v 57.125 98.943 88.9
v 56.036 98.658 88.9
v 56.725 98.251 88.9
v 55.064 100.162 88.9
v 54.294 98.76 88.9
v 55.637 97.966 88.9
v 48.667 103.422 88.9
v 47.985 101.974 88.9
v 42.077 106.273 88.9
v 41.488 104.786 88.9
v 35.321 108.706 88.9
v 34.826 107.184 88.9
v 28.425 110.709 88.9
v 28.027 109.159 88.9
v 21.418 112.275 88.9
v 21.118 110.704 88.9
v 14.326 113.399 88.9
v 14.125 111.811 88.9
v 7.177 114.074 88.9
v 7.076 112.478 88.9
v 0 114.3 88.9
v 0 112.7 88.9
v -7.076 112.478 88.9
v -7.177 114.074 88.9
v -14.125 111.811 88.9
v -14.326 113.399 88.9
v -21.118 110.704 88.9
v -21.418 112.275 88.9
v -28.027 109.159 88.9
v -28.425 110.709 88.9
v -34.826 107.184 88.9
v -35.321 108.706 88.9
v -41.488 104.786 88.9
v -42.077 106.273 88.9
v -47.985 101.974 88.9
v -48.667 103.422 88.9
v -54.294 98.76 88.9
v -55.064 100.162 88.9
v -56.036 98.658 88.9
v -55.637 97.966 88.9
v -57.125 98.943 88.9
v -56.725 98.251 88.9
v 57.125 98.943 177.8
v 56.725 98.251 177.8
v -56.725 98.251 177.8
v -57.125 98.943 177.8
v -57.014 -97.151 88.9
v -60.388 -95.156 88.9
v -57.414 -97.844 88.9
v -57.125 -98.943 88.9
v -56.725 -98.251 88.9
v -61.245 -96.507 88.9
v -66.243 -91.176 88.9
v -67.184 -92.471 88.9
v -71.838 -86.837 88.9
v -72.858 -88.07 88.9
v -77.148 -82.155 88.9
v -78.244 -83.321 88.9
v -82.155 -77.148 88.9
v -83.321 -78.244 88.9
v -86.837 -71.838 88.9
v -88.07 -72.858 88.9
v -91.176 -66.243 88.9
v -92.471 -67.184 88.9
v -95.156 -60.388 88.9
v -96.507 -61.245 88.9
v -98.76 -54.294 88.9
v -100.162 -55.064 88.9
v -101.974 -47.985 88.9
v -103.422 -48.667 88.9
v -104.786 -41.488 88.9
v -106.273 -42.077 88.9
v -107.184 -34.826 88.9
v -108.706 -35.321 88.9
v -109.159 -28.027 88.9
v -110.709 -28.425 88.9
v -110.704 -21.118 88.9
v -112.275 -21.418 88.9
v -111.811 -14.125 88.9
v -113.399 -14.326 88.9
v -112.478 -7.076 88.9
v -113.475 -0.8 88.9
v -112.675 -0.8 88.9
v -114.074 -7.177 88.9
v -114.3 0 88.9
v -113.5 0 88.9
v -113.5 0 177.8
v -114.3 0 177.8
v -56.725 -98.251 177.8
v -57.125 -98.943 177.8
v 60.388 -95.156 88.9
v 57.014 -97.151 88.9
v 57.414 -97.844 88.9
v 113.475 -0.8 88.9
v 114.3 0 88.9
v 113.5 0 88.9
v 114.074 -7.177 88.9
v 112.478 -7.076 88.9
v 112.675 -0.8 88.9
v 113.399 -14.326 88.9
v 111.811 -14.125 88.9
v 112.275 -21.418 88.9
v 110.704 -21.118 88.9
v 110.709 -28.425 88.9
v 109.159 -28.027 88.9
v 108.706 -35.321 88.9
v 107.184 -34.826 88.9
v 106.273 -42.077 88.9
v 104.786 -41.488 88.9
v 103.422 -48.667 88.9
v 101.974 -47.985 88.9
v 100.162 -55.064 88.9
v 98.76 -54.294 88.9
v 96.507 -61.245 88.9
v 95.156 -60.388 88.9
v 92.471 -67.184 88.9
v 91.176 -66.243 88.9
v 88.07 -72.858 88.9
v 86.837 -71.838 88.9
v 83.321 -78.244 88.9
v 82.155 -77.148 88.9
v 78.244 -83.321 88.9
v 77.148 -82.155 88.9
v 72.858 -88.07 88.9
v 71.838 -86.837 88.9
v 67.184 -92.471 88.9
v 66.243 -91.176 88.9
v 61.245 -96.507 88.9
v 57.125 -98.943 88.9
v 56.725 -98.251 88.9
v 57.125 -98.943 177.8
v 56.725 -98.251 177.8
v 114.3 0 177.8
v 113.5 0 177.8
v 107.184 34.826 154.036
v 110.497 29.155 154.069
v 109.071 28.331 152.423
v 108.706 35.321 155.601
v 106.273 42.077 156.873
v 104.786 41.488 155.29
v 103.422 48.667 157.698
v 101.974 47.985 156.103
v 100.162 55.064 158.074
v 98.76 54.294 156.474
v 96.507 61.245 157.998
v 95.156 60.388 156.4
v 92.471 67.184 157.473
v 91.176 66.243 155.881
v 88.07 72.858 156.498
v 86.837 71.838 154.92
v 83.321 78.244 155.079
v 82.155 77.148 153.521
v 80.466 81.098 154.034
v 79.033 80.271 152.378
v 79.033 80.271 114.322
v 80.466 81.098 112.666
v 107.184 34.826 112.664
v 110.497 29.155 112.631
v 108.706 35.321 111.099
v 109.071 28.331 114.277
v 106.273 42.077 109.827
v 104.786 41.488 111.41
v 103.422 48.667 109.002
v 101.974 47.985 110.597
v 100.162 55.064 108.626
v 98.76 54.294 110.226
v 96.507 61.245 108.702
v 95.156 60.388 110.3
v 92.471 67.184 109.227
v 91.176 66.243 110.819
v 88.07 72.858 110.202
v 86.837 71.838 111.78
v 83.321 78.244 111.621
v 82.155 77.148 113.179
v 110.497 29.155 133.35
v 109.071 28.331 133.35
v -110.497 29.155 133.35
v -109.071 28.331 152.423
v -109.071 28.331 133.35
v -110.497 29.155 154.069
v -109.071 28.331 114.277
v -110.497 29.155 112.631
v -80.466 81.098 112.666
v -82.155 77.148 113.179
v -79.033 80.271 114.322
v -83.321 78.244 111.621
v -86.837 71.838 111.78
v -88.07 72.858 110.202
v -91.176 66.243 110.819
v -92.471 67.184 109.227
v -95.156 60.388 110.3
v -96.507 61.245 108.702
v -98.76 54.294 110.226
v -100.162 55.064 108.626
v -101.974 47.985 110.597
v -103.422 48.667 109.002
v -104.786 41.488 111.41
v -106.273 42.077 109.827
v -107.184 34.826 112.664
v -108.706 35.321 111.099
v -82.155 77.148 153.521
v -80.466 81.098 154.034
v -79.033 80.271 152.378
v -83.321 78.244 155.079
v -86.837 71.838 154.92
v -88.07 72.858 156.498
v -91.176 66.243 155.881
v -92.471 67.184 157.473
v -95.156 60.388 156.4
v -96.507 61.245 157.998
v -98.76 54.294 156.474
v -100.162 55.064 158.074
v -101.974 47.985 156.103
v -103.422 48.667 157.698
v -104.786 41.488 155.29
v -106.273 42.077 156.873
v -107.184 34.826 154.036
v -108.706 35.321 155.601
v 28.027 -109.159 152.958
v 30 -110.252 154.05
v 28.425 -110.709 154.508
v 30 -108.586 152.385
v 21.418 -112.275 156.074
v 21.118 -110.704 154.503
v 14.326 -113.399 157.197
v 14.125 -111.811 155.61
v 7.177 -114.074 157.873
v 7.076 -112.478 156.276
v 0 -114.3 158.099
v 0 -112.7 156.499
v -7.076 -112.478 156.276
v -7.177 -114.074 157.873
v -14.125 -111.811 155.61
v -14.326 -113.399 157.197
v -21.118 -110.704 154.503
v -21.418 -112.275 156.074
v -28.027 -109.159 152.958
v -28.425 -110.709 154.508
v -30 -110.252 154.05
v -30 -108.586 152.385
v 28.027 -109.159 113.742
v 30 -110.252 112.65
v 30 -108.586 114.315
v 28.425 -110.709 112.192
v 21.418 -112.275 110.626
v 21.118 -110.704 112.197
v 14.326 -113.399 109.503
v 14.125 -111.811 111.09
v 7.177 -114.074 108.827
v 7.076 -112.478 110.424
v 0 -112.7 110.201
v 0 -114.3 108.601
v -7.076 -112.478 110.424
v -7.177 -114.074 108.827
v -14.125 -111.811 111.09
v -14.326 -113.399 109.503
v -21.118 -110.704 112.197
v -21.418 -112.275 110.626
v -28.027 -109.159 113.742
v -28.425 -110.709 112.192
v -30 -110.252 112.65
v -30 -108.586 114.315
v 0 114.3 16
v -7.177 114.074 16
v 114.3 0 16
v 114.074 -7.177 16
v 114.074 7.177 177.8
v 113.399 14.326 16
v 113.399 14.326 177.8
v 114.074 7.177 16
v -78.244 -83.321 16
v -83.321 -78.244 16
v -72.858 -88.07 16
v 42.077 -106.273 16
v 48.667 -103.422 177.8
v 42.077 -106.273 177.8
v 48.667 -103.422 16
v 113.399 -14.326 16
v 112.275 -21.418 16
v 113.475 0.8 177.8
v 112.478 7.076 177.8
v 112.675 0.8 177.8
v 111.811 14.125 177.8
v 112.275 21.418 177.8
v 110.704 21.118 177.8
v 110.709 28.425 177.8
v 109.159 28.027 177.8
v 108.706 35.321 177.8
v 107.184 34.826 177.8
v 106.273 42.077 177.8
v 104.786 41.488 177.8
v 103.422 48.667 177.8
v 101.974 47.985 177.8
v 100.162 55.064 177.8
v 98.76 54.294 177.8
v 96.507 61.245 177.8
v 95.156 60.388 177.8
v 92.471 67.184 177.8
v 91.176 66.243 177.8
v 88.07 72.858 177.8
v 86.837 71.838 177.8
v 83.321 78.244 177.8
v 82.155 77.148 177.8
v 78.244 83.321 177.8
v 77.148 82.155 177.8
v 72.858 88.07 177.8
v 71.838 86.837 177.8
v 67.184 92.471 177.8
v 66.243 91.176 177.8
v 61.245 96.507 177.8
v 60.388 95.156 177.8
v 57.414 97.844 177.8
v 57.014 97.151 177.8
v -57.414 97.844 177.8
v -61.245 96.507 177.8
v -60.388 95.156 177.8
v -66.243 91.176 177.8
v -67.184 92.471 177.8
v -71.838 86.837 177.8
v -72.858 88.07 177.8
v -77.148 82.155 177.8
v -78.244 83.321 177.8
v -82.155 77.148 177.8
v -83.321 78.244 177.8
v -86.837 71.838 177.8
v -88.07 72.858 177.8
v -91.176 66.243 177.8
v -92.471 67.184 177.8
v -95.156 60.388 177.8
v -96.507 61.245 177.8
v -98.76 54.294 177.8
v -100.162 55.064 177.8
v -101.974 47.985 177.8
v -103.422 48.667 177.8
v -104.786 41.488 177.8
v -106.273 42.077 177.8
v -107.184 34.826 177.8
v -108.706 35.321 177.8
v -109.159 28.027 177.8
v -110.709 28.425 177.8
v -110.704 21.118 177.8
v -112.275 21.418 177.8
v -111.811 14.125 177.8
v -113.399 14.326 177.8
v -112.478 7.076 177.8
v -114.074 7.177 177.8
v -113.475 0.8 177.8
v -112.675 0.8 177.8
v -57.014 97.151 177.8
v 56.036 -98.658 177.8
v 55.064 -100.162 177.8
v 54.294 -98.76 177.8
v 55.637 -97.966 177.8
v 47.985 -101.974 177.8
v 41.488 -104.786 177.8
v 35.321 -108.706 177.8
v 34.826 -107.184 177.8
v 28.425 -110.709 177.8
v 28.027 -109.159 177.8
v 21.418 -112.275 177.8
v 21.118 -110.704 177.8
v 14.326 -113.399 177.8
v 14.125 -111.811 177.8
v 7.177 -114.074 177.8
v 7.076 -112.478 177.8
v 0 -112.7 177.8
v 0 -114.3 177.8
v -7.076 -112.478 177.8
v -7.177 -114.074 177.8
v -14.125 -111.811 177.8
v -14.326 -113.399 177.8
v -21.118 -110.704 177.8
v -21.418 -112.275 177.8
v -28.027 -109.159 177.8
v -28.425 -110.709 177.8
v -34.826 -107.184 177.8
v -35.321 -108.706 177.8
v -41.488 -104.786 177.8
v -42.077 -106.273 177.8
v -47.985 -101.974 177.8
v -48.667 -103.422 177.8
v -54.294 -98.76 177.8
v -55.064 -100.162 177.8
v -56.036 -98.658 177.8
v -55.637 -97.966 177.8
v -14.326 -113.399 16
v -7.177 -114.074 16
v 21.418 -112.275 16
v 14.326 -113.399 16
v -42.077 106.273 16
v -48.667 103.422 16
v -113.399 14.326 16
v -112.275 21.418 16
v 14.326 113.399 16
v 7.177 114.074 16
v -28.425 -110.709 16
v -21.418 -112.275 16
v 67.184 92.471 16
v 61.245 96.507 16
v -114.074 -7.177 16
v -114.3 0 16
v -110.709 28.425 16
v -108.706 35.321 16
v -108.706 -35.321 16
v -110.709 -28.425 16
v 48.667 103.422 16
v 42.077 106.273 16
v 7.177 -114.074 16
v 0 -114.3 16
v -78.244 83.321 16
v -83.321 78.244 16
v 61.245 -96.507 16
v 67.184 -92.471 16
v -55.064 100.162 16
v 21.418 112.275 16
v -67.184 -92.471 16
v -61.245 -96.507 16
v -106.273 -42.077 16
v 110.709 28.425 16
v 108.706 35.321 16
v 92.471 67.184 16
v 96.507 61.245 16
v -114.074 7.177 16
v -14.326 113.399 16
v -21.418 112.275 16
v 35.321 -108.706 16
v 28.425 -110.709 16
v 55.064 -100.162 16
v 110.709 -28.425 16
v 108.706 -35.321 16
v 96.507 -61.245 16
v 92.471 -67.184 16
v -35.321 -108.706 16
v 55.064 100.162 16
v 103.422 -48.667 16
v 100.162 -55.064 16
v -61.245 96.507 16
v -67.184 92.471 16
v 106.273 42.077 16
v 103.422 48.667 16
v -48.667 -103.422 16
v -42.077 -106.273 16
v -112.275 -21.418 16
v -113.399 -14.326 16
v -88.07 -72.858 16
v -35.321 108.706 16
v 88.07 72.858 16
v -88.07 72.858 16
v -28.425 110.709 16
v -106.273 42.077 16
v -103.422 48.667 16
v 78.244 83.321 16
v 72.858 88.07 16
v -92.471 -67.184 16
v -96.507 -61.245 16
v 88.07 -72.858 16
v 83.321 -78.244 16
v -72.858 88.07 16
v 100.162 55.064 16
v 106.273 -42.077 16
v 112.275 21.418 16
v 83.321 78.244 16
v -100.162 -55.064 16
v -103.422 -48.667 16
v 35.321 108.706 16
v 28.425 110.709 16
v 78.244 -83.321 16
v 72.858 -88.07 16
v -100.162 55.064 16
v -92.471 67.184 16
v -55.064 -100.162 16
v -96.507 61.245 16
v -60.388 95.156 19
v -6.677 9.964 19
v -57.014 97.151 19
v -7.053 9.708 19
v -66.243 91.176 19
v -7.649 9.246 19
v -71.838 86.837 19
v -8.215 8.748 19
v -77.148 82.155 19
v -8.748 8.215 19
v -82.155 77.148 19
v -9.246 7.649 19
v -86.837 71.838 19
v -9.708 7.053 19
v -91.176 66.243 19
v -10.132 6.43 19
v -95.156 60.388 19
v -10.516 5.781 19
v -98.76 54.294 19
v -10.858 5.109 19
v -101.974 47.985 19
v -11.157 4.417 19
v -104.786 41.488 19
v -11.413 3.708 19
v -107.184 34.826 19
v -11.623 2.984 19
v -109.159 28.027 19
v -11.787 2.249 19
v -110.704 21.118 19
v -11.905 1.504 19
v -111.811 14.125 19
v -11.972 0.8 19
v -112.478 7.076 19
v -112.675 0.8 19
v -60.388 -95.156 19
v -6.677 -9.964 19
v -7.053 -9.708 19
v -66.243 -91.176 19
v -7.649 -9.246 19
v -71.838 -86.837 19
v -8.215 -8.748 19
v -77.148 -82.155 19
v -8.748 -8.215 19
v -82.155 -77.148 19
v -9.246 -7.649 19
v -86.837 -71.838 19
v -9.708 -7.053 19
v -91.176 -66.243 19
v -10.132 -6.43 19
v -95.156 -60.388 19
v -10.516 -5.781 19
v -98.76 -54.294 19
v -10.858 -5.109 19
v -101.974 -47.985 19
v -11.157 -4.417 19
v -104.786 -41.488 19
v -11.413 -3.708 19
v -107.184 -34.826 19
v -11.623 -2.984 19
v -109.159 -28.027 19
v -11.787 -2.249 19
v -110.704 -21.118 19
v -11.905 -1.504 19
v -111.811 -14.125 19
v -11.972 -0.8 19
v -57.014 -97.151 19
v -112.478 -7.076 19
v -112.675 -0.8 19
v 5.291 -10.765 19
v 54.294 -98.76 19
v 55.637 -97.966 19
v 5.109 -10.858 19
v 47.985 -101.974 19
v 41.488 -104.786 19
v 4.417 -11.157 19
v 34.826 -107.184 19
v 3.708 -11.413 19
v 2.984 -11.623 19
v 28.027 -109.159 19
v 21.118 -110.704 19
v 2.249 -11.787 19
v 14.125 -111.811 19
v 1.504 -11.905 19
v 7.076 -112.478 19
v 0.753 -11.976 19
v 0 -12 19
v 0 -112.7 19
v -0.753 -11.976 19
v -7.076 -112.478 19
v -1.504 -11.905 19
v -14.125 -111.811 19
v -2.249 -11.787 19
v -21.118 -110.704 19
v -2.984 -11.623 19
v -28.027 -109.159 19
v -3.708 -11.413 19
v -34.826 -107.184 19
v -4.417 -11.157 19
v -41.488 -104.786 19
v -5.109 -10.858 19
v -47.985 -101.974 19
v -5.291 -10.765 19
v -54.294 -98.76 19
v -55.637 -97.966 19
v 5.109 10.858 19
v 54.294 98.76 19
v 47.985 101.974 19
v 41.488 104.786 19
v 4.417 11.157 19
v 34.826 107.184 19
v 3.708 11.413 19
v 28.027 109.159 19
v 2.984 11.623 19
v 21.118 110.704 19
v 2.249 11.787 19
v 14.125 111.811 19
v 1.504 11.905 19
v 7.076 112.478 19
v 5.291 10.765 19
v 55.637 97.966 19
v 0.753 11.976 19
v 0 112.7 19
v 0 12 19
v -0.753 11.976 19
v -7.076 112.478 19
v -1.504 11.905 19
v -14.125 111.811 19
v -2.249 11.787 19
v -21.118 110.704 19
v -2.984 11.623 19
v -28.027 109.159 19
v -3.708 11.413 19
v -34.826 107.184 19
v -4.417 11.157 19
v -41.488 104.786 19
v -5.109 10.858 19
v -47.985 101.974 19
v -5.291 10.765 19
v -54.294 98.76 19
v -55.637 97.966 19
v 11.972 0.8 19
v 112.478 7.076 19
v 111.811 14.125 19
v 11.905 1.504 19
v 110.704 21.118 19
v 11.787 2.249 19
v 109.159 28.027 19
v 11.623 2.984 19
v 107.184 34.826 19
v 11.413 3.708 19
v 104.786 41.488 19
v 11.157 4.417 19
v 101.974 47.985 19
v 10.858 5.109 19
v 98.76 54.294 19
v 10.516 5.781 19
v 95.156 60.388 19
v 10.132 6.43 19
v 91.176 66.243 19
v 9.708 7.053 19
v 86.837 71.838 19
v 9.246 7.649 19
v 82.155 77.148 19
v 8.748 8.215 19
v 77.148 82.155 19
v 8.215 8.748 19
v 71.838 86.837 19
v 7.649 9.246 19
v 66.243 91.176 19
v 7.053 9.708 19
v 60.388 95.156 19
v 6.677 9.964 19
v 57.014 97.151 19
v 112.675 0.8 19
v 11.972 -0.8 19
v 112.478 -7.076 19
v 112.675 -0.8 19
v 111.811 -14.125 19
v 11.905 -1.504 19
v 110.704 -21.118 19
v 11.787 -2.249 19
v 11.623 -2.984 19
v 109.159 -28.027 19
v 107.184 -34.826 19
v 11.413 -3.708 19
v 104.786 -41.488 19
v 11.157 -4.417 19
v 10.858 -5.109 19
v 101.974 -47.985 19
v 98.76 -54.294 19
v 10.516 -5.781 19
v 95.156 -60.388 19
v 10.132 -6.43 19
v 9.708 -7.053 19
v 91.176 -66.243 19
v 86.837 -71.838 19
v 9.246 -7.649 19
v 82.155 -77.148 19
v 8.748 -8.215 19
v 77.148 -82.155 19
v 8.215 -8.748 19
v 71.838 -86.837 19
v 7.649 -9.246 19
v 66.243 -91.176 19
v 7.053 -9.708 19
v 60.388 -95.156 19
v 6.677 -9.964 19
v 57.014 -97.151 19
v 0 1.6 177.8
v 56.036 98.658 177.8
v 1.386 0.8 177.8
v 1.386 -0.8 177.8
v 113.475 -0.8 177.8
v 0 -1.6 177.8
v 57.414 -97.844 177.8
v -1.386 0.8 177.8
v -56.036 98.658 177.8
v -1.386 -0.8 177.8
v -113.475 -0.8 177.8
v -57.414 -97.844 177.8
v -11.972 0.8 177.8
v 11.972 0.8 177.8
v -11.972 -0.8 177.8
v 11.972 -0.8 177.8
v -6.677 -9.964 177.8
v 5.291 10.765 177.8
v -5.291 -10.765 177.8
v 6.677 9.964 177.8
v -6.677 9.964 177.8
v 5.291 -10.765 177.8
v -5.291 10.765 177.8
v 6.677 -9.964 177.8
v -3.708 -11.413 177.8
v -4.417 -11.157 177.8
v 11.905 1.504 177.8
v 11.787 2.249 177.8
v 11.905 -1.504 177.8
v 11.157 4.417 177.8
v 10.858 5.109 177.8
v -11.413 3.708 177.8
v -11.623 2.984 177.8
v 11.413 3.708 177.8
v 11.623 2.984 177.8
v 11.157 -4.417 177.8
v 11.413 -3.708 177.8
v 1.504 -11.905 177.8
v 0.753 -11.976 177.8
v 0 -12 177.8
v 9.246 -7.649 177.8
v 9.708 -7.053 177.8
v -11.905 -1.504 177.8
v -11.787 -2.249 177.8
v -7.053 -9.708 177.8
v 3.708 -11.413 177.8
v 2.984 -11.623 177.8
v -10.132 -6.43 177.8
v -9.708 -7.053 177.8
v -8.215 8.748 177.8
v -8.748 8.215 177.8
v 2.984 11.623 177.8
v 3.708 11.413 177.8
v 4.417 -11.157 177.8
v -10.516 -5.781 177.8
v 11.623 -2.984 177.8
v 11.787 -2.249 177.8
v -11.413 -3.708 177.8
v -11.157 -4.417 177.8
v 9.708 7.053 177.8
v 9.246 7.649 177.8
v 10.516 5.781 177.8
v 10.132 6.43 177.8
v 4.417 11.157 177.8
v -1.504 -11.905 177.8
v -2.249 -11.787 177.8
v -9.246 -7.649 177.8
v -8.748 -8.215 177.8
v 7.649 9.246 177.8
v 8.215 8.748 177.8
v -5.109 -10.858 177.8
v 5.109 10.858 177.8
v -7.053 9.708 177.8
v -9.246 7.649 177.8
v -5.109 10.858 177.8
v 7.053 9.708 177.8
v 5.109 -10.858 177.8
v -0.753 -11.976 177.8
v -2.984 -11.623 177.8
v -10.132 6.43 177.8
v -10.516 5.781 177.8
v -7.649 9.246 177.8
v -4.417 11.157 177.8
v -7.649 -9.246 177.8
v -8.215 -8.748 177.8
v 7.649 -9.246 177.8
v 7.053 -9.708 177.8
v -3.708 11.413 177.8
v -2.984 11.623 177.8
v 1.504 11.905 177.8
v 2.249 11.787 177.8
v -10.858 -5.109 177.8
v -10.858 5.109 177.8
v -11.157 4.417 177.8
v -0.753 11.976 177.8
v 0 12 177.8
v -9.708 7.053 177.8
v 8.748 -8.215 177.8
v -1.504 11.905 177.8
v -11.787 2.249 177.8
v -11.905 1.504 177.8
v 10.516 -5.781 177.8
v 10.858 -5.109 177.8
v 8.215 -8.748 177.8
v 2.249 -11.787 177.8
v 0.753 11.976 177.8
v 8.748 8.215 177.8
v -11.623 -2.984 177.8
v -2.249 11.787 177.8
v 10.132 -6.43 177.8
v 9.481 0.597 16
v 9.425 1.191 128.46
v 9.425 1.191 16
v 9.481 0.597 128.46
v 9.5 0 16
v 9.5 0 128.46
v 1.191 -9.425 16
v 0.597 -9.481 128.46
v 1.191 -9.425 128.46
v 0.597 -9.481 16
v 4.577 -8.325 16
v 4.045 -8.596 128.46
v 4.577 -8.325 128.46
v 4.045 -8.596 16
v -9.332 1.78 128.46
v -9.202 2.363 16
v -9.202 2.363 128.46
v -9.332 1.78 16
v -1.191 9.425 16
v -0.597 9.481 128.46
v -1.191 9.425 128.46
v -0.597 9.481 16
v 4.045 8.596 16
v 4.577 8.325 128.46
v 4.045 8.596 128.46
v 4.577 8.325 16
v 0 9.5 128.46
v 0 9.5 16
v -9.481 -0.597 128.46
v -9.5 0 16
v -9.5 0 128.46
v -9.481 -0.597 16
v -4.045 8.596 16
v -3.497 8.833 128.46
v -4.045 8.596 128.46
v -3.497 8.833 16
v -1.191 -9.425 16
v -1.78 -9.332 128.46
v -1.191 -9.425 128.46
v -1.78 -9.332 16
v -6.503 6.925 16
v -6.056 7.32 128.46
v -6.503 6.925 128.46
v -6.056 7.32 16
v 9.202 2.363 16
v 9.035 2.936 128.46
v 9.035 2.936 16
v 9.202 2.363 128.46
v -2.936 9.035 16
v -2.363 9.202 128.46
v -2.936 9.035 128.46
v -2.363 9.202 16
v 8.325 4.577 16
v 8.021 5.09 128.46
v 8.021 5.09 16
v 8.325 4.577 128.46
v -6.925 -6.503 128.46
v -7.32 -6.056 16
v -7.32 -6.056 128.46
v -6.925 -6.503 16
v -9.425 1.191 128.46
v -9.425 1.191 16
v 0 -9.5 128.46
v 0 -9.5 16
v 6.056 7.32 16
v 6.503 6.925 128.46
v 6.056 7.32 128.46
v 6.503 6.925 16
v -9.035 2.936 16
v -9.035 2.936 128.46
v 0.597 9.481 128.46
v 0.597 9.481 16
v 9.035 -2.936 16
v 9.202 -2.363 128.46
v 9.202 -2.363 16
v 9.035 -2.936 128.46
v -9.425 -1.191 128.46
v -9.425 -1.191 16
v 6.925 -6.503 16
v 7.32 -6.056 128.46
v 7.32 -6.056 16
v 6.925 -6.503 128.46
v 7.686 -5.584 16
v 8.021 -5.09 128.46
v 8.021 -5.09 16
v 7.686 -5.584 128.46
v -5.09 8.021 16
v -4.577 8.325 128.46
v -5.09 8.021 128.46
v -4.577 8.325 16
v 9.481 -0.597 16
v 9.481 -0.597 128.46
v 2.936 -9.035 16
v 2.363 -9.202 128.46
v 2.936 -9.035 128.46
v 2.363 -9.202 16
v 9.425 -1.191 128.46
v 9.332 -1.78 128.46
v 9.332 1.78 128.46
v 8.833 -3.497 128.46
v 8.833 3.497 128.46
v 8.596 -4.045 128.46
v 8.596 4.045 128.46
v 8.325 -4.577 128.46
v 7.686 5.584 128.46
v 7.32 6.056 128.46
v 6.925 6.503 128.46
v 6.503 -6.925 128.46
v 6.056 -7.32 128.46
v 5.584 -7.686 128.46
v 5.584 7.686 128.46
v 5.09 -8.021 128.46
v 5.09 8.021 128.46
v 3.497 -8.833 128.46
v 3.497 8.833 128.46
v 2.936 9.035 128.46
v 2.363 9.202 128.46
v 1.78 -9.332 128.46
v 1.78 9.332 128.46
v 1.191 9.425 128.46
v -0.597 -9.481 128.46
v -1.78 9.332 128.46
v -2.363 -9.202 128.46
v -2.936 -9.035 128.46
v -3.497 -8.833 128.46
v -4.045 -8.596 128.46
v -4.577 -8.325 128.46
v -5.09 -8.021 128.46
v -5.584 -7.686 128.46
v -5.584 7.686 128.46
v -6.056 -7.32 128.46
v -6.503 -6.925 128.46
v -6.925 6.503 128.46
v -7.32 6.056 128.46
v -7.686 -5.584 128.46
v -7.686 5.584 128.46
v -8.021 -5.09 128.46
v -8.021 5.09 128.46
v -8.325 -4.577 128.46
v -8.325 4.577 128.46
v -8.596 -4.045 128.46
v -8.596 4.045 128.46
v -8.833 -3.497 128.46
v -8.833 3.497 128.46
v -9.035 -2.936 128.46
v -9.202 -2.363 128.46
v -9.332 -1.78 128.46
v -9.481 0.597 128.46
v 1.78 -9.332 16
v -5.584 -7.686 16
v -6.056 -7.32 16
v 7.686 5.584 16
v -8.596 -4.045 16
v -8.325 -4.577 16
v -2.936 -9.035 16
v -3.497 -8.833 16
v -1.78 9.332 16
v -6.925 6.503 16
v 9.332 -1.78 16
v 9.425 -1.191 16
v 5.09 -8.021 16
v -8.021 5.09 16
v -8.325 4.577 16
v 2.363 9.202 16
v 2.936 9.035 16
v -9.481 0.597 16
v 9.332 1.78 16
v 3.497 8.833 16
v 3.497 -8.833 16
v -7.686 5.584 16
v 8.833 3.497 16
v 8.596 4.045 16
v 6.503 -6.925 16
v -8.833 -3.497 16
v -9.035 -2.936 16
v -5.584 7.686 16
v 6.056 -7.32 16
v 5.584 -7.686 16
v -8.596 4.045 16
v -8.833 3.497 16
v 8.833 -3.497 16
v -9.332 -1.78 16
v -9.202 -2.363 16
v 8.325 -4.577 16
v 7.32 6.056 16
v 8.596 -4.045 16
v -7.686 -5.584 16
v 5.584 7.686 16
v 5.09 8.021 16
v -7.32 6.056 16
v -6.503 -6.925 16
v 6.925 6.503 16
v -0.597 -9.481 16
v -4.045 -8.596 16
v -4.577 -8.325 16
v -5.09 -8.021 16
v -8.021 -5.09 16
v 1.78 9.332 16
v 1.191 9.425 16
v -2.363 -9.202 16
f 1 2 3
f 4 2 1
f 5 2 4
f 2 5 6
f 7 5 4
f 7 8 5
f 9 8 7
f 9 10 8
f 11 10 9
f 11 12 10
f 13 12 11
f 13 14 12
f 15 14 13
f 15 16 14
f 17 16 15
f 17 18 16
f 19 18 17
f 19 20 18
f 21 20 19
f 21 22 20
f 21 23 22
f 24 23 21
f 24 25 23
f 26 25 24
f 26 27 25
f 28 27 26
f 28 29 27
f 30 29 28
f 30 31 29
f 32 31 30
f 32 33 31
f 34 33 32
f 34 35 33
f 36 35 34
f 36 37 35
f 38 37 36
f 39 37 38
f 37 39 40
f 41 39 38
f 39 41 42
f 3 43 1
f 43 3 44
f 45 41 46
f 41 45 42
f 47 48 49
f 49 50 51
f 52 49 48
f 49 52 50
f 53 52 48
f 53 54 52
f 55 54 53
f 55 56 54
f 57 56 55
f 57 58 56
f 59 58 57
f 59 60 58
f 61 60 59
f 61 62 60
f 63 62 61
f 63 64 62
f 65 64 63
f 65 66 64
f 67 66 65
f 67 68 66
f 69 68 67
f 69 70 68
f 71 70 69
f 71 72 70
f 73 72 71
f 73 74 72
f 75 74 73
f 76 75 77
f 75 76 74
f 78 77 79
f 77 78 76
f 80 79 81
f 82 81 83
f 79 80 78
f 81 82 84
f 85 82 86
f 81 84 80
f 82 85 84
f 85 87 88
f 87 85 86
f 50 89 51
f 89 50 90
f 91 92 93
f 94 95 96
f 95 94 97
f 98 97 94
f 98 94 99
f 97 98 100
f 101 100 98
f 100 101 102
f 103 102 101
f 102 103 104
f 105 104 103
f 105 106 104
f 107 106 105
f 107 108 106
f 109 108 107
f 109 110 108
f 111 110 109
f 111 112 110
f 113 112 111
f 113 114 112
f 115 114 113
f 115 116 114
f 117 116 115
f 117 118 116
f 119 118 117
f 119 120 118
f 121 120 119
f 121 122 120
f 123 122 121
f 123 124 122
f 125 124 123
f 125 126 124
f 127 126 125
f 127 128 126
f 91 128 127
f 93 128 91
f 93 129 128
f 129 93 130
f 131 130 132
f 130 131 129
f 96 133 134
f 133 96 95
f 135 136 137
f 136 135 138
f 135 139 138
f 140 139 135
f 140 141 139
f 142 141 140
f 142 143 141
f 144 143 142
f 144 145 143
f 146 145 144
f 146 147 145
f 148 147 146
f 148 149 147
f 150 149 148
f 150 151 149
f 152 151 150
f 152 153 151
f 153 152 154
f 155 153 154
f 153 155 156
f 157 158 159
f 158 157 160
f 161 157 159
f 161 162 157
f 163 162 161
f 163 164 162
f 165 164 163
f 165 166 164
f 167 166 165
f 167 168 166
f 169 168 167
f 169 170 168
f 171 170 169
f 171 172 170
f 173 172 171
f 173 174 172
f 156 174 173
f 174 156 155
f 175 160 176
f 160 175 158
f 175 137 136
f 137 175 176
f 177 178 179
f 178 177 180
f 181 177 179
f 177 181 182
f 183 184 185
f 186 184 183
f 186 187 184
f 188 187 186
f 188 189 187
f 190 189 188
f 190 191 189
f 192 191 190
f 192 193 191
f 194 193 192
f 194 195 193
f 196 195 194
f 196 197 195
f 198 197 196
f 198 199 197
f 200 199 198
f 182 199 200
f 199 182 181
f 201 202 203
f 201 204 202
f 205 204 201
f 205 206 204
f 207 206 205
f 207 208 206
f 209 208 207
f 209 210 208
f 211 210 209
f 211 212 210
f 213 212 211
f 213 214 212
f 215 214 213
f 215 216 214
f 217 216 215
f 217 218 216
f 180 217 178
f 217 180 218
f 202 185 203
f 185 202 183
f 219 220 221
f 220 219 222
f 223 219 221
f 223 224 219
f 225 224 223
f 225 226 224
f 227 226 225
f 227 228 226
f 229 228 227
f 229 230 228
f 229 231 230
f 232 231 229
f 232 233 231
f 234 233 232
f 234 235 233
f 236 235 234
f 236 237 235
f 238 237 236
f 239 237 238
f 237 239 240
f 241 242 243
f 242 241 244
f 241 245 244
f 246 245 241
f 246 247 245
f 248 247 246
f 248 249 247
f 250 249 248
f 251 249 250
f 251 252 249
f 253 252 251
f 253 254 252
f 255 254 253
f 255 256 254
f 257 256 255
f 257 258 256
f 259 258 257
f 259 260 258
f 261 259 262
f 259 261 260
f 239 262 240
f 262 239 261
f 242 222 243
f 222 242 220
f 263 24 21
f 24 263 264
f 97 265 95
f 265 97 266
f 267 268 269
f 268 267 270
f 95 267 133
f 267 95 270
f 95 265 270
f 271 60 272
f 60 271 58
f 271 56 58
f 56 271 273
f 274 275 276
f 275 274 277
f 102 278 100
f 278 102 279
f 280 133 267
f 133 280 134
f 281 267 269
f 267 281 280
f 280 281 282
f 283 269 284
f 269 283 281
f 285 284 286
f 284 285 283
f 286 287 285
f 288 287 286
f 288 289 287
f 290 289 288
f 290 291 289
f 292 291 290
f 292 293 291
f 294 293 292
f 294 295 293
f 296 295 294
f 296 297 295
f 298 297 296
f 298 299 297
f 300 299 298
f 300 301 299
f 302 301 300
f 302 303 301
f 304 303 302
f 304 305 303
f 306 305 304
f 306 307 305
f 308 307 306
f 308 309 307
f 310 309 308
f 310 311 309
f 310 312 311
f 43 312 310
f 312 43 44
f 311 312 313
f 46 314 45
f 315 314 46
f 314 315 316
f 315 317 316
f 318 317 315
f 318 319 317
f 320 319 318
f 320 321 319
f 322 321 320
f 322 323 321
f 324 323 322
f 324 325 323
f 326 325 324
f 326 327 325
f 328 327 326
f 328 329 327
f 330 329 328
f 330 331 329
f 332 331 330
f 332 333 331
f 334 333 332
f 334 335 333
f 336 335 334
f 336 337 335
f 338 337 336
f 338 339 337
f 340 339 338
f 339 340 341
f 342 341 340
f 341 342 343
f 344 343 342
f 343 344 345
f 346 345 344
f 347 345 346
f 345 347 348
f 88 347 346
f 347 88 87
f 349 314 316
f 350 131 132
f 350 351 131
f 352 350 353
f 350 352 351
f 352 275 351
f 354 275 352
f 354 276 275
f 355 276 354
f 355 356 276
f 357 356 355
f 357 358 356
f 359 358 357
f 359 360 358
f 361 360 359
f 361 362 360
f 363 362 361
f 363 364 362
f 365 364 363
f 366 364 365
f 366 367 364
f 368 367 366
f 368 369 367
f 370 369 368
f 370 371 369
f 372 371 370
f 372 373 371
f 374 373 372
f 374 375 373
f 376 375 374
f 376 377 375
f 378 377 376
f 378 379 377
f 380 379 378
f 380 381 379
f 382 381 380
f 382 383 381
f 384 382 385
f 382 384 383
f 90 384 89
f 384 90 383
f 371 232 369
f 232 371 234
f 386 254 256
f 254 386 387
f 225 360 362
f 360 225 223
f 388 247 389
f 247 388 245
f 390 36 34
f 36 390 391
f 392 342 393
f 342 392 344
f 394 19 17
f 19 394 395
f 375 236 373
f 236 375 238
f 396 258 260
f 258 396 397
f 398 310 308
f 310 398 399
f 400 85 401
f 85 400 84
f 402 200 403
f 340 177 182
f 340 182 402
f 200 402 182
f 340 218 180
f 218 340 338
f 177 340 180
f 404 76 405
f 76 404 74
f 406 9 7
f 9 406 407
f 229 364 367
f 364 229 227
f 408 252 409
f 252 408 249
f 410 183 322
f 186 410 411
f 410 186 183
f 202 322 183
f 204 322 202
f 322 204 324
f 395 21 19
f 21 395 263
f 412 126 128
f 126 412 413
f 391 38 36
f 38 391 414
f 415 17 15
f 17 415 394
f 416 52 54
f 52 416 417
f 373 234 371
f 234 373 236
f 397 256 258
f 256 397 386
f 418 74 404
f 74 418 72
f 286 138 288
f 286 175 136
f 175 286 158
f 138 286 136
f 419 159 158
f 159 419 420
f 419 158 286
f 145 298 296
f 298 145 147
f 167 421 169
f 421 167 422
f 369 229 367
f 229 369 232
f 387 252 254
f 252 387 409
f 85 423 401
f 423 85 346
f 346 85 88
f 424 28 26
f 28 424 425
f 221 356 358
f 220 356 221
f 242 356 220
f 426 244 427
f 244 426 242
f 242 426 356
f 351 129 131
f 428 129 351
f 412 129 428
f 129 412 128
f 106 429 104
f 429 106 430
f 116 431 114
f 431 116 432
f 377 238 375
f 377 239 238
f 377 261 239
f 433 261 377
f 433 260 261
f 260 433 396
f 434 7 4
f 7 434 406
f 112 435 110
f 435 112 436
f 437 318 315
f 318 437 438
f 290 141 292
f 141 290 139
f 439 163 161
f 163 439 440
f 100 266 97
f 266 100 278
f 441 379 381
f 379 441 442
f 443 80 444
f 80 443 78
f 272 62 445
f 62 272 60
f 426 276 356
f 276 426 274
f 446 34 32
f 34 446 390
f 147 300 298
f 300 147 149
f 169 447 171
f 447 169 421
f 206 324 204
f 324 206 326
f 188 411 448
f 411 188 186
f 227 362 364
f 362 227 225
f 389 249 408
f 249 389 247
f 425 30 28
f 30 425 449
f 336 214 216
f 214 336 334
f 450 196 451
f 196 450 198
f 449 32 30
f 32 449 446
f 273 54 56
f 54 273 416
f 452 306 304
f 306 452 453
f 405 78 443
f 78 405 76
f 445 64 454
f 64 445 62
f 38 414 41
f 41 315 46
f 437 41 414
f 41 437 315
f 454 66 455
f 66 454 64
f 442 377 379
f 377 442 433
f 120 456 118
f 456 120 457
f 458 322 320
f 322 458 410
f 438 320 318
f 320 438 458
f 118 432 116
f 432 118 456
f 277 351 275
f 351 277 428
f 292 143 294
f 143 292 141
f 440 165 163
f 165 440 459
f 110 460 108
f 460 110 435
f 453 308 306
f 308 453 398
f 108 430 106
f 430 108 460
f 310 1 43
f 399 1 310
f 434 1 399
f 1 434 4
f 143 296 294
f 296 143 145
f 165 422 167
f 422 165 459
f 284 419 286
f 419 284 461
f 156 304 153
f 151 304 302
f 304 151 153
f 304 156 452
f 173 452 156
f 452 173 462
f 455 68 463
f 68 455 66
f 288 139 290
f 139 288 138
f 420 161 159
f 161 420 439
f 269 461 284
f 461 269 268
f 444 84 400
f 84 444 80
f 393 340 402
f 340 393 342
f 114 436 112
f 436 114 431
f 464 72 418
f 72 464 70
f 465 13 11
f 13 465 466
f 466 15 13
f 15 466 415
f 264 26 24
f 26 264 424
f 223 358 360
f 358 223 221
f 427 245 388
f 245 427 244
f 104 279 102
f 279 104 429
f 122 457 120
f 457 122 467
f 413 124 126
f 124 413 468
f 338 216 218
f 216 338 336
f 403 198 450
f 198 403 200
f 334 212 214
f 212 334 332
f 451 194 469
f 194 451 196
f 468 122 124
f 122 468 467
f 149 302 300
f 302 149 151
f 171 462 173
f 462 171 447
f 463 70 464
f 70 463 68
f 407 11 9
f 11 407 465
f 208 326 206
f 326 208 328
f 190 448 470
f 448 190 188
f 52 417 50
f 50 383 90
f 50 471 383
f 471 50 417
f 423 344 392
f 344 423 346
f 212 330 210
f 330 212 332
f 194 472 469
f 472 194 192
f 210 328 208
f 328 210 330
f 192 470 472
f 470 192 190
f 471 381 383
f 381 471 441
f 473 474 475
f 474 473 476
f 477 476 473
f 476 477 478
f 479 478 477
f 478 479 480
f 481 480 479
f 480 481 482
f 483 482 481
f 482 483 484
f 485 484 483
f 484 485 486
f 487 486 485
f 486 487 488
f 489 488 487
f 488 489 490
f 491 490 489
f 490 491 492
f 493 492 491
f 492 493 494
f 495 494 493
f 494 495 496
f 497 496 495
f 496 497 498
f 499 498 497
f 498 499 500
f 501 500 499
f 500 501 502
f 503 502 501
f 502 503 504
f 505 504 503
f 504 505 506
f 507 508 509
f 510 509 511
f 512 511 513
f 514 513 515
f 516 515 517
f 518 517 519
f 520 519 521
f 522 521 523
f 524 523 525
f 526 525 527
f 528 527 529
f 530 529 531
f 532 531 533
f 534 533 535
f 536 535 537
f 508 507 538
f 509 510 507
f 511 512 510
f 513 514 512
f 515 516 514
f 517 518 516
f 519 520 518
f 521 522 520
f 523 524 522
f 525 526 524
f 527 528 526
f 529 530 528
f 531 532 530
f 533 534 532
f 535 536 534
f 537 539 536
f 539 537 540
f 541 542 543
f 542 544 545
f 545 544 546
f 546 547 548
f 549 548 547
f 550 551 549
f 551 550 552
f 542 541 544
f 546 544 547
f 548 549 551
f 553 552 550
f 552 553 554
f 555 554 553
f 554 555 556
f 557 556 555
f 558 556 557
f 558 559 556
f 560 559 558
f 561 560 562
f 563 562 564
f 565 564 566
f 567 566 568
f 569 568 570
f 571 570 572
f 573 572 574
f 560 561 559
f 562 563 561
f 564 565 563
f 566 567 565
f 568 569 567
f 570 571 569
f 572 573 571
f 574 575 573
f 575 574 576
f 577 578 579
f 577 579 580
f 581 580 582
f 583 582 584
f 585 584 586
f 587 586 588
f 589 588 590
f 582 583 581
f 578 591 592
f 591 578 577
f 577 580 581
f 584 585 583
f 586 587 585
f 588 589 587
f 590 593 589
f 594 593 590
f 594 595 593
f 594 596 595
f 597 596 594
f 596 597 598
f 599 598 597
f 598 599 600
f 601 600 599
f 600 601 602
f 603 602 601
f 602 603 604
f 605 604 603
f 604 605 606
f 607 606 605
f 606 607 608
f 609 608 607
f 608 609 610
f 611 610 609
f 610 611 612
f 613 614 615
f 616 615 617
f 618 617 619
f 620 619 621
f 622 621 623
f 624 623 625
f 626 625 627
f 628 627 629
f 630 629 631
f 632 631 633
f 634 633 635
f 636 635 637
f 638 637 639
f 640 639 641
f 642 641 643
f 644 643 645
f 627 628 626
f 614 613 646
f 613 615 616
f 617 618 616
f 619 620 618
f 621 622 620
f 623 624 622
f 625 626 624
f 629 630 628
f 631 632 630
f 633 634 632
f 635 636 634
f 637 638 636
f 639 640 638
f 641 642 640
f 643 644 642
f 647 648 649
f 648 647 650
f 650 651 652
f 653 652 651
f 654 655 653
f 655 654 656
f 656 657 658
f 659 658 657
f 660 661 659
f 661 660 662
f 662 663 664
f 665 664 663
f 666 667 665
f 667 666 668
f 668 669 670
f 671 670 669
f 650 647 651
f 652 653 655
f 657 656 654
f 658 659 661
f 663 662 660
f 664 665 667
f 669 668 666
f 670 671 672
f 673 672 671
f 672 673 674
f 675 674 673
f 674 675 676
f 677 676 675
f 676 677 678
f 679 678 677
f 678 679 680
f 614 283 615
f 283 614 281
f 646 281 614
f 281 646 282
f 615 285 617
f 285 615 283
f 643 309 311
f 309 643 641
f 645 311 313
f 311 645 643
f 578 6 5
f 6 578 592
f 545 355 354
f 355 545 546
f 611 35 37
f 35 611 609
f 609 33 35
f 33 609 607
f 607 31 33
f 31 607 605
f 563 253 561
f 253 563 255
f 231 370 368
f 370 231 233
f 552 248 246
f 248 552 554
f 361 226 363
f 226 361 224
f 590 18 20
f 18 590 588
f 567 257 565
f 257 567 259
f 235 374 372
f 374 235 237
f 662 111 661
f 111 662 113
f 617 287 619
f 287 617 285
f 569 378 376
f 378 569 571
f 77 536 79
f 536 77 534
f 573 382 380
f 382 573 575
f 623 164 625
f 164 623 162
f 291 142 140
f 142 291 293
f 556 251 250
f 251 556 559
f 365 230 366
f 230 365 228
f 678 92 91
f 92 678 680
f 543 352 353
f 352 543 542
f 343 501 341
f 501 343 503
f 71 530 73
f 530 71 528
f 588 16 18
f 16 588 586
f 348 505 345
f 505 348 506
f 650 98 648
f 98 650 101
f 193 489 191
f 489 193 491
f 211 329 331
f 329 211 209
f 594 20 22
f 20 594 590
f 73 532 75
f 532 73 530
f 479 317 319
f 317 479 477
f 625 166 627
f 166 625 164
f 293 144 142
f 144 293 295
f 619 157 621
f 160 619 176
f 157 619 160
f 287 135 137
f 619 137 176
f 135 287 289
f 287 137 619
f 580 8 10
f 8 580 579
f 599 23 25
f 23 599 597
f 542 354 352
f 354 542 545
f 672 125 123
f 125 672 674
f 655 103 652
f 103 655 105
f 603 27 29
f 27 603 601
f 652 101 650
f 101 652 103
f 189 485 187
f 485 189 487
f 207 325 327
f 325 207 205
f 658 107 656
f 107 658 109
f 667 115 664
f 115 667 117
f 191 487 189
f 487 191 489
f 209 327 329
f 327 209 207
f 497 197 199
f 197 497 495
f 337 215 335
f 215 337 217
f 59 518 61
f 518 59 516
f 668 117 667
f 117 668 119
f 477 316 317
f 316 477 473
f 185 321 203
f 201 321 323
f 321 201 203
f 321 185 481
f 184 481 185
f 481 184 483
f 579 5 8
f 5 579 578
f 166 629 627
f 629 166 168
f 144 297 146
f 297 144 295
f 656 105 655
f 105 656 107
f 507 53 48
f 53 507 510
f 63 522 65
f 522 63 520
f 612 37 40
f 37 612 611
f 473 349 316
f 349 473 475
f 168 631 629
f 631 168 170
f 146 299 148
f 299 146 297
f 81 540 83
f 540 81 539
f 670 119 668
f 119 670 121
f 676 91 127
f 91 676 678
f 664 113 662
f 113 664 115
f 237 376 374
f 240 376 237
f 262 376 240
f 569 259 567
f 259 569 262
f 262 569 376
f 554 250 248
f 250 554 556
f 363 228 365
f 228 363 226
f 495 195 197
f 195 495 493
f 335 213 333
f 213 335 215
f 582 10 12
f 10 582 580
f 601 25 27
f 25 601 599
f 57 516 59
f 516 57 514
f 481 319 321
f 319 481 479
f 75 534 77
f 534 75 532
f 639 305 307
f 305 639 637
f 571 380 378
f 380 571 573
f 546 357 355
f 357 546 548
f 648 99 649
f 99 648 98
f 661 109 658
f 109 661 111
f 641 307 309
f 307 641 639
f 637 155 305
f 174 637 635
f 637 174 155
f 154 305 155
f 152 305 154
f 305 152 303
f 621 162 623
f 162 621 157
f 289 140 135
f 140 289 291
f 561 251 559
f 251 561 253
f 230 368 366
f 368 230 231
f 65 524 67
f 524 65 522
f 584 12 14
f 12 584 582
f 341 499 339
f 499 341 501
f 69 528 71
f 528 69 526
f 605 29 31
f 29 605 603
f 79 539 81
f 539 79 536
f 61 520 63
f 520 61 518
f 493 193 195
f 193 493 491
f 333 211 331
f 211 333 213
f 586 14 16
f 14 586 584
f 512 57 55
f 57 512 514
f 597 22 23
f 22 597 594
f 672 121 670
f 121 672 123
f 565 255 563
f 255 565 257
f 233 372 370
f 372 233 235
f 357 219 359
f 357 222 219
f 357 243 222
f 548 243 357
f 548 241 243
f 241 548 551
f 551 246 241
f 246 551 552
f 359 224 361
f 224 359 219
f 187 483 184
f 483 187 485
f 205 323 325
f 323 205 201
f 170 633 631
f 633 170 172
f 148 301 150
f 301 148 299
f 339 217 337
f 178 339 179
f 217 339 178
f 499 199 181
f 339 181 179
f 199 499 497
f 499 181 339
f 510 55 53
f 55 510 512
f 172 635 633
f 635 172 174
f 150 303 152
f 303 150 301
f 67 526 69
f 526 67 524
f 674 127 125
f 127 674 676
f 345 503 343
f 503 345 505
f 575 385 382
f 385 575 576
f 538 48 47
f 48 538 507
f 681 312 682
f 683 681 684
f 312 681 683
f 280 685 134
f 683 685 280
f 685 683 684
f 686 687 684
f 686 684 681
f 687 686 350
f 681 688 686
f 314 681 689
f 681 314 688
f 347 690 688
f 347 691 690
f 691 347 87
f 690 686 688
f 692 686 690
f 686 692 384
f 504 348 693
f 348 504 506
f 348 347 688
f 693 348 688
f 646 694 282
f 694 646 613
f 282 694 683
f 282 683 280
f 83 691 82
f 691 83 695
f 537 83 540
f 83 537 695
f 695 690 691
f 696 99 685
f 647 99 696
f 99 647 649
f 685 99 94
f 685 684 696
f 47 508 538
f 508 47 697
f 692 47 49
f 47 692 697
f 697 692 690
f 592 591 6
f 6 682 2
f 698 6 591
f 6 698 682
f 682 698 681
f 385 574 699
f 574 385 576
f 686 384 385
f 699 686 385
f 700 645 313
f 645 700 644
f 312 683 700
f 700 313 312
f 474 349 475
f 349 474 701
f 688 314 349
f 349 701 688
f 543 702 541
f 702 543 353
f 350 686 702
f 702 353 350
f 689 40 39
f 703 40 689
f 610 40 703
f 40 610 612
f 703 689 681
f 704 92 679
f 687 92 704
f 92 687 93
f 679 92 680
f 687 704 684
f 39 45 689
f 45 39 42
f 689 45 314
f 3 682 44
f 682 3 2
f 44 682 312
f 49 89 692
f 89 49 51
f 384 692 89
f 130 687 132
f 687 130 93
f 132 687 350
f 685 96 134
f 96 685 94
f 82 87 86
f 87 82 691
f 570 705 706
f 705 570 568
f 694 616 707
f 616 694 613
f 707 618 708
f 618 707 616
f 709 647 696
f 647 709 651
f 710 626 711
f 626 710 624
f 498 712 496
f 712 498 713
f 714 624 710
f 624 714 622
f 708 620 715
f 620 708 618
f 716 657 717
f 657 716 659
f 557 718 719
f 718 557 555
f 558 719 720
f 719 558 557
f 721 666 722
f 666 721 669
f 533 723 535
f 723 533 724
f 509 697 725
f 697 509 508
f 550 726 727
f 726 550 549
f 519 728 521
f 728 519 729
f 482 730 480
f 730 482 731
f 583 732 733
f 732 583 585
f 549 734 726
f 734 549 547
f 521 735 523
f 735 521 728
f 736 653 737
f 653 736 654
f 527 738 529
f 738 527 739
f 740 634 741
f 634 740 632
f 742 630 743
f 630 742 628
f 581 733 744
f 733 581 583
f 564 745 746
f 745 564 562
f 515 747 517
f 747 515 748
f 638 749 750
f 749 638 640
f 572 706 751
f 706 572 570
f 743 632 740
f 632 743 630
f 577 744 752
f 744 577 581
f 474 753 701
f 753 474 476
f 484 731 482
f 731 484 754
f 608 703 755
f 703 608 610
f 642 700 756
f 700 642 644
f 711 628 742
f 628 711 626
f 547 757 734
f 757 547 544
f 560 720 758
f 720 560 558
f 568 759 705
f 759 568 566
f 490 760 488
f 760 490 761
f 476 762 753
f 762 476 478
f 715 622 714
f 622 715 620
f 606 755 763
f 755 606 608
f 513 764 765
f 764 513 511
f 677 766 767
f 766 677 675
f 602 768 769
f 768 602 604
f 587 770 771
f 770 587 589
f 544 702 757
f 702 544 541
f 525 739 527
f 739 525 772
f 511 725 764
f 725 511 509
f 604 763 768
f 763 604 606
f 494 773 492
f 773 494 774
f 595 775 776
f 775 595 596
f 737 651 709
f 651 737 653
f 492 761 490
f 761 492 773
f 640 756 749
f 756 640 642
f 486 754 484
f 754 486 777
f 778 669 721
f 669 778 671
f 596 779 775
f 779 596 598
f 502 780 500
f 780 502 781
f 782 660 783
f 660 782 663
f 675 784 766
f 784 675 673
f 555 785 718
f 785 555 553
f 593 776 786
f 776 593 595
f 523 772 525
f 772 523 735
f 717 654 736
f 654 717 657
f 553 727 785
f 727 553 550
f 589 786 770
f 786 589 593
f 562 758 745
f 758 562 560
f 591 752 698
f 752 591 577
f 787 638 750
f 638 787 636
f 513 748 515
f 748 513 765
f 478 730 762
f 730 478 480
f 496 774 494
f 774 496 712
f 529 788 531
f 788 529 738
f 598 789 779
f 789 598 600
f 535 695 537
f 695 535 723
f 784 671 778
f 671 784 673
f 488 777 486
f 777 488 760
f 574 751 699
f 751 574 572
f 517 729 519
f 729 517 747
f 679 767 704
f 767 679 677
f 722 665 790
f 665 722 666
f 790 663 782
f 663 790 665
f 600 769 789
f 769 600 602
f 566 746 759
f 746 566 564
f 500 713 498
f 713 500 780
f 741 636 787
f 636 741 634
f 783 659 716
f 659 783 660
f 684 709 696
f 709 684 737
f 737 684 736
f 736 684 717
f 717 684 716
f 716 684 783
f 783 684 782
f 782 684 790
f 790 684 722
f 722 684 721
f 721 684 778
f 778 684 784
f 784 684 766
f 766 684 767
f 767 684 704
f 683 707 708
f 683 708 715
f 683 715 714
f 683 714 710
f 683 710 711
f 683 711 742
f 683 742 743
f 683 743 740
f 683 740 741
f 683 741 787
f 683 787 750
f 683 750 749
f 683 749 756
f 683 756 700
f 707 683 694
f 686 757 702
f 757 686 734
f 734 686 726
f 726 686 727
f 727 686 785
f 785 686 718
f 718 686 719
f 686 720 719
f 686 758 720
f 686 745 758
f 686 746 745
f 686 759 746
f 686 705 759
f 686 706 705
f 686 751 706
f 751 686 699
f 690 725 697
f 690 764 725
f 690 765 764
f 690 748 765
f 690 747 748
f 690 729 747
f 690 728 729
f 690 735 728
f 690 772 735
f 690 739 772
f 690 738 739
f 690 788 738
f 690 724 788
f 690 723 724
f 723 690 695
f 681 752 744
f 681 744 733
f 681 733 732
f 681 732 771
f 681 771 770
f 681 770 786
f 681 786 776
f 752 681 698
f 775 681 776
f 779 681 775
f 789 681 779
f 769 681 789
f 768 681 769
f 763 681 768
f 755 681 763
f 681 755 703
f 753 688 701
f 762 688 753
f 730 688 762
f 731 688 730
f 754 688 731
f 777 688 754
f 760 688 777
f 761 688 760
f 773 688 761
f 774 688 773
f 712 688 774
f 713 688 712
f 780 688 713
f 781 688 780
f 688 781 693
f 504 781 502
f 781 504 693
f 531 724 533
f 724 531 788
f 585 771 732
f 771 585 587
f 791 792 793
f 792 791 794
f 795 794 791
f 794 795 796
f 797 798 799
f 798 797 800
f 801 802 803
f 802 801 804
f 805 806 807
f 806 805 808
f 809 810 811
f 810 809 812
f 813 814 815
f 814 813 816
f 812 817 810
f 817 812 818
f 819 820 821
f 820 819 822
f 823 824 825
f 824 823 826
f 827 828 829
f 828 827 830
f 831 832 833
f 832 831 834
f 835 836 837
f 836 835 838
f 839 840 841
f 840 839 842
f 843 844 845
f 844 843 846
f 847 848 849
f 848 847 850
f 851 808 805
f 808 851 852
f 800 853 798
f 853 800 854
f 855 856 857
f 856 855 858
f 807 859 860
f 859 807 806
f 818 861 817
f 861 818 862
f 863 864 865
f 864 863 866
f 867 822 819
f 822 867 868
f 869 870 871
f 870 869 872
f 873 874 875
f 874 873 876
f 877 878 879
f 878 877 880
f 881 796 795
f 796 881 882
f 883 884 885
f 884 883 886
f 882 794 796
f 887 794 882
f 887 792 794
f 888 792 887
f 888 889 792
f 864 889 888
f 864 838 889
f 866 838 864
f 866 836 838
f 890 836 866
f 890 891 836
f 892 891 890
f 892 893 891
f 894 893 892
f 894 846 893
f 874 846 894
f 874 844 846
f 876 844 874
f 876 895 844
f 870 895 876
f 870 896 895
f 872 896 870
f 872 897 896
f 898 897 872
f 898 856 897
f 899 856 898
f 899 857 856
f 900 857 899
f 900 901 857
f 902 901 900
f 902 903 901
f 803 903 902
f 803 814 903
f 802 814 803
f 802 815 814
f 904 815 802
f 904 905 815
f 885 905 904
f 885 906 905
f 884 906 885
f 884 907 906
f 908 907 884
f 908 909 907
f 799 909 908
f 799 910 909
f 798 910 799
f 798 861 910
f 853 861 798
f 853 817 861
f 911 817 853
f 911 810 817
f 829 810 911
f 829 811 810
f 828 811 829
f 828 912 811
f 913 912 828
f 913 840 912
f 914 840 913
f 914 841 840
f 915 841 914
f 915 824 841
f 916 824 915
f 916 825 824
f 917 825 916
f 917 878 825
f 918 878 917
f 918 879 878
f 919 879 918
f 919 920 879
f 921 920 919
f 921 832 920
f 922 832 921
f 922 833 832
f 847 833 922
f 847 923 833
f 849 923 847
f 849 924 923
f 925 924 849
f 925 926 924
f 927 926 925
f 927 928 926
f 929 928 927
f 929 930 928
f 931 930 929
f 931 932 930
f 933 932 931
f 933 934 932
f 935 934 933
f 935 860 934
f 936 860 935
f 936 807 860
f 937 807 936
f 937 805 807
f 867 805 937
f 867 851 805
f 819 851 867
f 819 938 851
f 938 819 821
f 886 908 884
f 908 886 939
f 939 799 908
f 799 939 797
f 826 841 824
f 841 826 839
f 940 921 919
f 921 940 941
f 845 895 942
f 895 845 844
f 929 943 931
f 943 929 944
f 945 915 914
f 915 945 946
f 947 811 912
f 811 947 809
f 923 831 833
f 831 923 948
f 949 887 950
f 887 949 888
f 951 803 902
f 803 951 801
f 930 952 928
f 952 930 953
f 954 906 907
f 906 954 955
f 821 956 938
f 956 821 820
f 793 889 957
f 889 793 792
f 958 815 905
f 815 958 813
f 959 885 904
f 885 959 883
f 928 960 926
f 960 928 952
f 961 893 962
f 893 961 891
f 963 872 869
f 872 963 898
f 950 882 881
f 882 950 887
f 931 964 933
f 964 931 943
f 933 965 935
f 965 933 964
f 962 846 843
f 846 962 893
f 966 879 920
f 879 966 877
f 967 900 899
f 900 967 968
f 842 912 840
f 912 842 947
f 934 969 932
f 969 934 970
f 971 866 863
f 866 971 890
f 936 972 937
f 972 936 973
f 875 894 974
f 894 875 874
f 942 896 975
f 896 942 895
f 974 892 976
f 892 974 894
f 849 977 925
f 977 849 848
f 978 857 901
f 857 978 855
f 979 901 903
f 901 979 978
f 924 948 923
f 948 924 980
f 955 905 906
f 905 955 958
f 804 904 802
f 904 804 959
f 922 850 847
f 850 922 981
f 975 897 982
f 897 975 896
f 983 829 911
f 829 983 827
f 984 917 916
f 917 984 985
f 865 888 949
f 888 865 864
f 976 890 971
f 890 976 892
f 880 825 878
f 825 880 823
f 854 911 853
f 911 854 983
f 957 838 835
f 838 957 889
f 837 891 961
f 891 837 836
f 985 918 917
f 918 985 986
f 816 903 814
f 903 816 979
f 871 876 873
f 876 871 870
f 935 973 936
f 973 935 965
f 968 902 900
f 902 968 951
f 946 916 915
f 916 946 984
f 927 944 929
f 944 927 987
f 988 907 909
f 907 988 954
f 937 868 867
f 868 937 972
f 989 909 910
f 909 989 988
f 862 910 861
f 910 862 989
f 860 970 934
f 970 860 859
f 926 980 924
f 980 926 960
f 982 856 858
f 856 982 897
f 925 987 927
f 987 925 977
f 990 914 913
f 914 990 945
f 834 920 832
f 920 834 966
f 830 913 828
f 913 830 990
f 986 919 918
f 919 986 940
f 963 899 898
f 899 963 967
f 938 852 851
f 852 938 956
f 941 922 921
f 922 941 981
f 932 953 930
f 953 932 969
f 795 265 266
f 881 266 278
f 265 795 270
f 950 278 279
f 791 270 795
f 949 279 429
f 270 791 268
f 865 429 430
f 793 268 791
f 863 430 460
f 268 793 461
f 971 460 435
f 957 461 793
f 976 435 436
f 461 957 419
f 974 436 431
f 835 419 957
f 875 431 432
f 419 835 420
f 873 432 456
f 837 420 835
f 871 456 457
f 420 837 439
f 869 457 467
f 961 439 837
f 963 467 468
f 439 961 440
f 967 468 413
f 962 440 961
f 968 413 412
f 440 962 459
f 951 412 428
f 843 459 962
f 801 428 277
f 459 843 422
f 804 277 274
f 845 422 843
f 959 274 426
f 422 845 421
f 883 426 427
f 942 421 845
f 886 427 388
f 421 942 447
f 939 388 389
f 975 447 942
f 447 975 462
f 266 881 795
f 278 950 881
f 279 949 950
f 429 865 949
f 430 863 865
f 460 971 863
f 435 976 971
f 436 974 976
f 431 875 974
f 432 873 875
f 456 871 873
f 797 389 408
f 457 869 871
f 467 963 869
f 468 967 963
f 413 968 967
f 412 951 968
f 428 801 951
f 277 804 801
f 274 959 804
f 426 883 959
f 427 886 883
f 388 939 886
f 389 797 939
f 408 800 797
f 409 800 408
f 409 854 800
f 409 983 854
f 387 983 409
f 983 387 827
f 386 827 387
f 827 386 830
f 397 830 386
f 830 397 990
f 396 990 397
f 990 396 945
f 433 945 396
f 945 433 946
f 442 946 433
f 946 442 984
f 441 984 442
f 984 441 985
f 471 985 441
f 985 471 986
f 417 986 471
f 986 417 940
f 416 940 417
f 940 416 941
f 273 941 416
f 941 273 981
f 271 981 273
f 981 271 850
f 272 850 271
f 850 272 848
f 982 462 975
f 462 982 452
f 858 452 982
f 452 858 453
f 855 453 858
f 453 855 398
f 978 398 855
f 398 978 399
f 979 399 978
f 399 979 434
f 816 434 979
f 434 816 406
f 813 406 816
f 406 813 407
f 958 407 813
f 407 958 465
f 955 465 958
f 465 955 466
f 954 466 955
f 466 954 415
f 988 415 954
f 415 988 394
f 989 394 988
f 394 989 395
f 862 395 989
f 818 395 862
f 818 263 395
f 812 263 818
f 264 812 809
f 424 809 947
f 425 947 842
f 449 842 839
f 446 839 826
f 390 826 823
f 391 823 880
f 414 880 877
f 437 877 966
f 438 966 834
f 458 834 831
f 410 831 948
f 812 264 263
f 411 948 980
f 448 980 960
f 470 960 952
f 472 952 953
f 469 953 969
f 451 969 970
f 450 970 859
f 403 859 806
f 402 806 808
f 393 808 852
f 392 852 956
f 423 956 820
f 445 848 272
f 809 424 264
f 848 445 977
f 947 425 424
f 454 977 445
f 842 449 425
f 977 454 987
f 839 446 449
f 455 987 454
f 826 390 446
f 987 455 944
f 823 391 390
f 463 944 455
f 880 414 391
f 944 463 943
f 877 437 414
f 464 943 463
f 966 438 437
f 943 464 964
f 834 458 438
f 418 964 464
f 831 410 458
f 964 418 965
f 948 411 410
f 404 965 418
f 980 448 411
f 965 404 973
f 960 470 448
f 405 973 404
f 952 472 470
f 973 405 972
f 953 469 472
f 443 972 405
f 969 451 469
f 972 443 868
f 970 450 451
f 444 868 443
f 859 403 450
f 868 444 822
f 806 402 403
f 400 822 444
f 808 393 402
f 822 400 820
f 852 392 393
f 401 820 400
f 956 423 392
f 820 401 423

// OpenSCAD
// Suggestions to Save PLA on Main Holder (Bambu P1S Optimized)

// --- PARAMETERS ---

// Which part to display?
// 0 = Assembly View
// 1 = Base (Print this first)
// 2 = Main Holder Body (Print this second)
part_to_print = 2;

// SAVING MODE: Remove the vanity skirt?
// true = Holds utensils but you can see the spinning base (SAVES ~50g + SUPPORTS)
// false = Covers the base, but requires supports to print the bottom cavity
no_skirt_mode = false; 

inches_to_mm = 25.4;
width_inch = 9;
height_inch = 7;

// General Geometry
diameter = width_inch * inches_to_mm;
total_height = height_inch * inches_to_mm;
wall_thickness = 1.6; // 4 walls (0.4 nozzle)

// Base Mechanism Settings
base_puck_height = 15; 
spindle_diam = 18; 
spindle_height = total_height * 0.70; 
tolerance = 1.0; 
$fn = 100;

module assembly() {
    color("gray") LazySusanBase();
    color("burlywood") 
    translate([0,0, base_puck_height + 2]) 
    UtensilHolder();
}

module LazySusanBase() {
    union() {
        cylinder(h=base_puck_height, d=diameter - 5);
        cylinder(h=spindle_height, d=spindle_diam);
        translate([0,0,spindle_height]) sphere(d=spindle_diam);
    }
}

module UtensilHolder() {
    // Logic: If no_skirt_mode is ON, we chop off the bottom "skirt"
    // and lower the whole object so the internal floor touches Z=0.
    
    skirt_offset = no_skirt_mode ? 0 : (base_puck_height + 2);
    internal_floor_thickness = 2.0; 
    
    // The "Z" where the actual holding area starts
    floor_z = skirt_offset + internal_floor_thickness;

    difference() {
        
        // --- POSITIVE GEOMETRY ---
        union() {
            // 1. Main Outer Shell
            difference() {
                // If no skirt, we start the cylinder higher up (effectively shorter total print)
                translate([0,0, no_skirt_mode ? base_puck_height + 2 : 0])
                cylinder(h=total_height - (no_skirt_mode ? base_puck_height + 2 : 0), d=diameter);
                
                // Hollow out the bucket
                translate([0,0, floor_z])
                cylinder(h=total_height + 1, d=diameter - (wall_thickness*2));
                
                // Cut Down Pies (Existing Logic)
                for (a = [60, 180, 300]) {
                    rotate([0,0,a])
                    translate([0,0, total_height * 0.5]) 
                    linear_extrude(height = total_height)
                    polygon(points=[[0,0], [diameter, 0], [diameter * cos(60), diameter * sin(60)]]);
                }

                // --- BAMBU OPTIMIZATION: Diamond Windows ---
                // Replaces Pill shapes. 45-degree angles need ZERO support.
                for (a = [0, 120, 240]) { 
                     rotate([0,0,a + 30]) 
                     translate([diameter/2, 0, total_height * 0.75])
                     rotate([0, 45, 0]) // Rotate cube to make a diamond
                     cube([35, 60, 35], center=true);
                }
            }
            
            // 2. Center Hub (Thinned)
            translate([0,0, no_skirt_mode ? base_puck_height + 2 : 0])
            cylinder(h=total_height - (no_skirt_mode ? base_puck_height + 2 : 0), d=spindle_diam + 6); 
            
            // 3. Radial Dividers (Skeletonized)
            intersection() {
                translate([0,0, floor_z])
                cylinder(h=total_height, d=diameter - wall_thickness);
                
                translate([0,0,total_height/2])
                for(r = [0 : 60 : 360]) {
                    rotate([0,0,r])
                    difference() {
                        cube([diameter, wall_thickness, total_height], center=true);
                        // Cut Window in Divider
                        translate([diameter/3.5, 0, 15]) 
                        cube([diameter/3, wall_thickness + 5, total_height/1.5], center=true);
                    }
                }
            }
        }
        
        // --- NEGATIVE GEOMETRY ---
        
        // 1. Spindle Hole
        translate([0,0, -1])
        cylinder(h=spindle_height + 5, d=spindle_diam + tolerance);
        
        // 2. Base Puck Clearance (Only if skirt is enabled)
        if (!no_skirt_mode) {
            translate([0,0, -1])
            cylinder(h=base_puck_height + 2, d=diameter + 2); 
        }
    }
}

if (part_to_print == 0) assembly();
else if (part_to_print == 1) LazySusanBase();
else if (part_to_print == 2) UtensilHolder();
